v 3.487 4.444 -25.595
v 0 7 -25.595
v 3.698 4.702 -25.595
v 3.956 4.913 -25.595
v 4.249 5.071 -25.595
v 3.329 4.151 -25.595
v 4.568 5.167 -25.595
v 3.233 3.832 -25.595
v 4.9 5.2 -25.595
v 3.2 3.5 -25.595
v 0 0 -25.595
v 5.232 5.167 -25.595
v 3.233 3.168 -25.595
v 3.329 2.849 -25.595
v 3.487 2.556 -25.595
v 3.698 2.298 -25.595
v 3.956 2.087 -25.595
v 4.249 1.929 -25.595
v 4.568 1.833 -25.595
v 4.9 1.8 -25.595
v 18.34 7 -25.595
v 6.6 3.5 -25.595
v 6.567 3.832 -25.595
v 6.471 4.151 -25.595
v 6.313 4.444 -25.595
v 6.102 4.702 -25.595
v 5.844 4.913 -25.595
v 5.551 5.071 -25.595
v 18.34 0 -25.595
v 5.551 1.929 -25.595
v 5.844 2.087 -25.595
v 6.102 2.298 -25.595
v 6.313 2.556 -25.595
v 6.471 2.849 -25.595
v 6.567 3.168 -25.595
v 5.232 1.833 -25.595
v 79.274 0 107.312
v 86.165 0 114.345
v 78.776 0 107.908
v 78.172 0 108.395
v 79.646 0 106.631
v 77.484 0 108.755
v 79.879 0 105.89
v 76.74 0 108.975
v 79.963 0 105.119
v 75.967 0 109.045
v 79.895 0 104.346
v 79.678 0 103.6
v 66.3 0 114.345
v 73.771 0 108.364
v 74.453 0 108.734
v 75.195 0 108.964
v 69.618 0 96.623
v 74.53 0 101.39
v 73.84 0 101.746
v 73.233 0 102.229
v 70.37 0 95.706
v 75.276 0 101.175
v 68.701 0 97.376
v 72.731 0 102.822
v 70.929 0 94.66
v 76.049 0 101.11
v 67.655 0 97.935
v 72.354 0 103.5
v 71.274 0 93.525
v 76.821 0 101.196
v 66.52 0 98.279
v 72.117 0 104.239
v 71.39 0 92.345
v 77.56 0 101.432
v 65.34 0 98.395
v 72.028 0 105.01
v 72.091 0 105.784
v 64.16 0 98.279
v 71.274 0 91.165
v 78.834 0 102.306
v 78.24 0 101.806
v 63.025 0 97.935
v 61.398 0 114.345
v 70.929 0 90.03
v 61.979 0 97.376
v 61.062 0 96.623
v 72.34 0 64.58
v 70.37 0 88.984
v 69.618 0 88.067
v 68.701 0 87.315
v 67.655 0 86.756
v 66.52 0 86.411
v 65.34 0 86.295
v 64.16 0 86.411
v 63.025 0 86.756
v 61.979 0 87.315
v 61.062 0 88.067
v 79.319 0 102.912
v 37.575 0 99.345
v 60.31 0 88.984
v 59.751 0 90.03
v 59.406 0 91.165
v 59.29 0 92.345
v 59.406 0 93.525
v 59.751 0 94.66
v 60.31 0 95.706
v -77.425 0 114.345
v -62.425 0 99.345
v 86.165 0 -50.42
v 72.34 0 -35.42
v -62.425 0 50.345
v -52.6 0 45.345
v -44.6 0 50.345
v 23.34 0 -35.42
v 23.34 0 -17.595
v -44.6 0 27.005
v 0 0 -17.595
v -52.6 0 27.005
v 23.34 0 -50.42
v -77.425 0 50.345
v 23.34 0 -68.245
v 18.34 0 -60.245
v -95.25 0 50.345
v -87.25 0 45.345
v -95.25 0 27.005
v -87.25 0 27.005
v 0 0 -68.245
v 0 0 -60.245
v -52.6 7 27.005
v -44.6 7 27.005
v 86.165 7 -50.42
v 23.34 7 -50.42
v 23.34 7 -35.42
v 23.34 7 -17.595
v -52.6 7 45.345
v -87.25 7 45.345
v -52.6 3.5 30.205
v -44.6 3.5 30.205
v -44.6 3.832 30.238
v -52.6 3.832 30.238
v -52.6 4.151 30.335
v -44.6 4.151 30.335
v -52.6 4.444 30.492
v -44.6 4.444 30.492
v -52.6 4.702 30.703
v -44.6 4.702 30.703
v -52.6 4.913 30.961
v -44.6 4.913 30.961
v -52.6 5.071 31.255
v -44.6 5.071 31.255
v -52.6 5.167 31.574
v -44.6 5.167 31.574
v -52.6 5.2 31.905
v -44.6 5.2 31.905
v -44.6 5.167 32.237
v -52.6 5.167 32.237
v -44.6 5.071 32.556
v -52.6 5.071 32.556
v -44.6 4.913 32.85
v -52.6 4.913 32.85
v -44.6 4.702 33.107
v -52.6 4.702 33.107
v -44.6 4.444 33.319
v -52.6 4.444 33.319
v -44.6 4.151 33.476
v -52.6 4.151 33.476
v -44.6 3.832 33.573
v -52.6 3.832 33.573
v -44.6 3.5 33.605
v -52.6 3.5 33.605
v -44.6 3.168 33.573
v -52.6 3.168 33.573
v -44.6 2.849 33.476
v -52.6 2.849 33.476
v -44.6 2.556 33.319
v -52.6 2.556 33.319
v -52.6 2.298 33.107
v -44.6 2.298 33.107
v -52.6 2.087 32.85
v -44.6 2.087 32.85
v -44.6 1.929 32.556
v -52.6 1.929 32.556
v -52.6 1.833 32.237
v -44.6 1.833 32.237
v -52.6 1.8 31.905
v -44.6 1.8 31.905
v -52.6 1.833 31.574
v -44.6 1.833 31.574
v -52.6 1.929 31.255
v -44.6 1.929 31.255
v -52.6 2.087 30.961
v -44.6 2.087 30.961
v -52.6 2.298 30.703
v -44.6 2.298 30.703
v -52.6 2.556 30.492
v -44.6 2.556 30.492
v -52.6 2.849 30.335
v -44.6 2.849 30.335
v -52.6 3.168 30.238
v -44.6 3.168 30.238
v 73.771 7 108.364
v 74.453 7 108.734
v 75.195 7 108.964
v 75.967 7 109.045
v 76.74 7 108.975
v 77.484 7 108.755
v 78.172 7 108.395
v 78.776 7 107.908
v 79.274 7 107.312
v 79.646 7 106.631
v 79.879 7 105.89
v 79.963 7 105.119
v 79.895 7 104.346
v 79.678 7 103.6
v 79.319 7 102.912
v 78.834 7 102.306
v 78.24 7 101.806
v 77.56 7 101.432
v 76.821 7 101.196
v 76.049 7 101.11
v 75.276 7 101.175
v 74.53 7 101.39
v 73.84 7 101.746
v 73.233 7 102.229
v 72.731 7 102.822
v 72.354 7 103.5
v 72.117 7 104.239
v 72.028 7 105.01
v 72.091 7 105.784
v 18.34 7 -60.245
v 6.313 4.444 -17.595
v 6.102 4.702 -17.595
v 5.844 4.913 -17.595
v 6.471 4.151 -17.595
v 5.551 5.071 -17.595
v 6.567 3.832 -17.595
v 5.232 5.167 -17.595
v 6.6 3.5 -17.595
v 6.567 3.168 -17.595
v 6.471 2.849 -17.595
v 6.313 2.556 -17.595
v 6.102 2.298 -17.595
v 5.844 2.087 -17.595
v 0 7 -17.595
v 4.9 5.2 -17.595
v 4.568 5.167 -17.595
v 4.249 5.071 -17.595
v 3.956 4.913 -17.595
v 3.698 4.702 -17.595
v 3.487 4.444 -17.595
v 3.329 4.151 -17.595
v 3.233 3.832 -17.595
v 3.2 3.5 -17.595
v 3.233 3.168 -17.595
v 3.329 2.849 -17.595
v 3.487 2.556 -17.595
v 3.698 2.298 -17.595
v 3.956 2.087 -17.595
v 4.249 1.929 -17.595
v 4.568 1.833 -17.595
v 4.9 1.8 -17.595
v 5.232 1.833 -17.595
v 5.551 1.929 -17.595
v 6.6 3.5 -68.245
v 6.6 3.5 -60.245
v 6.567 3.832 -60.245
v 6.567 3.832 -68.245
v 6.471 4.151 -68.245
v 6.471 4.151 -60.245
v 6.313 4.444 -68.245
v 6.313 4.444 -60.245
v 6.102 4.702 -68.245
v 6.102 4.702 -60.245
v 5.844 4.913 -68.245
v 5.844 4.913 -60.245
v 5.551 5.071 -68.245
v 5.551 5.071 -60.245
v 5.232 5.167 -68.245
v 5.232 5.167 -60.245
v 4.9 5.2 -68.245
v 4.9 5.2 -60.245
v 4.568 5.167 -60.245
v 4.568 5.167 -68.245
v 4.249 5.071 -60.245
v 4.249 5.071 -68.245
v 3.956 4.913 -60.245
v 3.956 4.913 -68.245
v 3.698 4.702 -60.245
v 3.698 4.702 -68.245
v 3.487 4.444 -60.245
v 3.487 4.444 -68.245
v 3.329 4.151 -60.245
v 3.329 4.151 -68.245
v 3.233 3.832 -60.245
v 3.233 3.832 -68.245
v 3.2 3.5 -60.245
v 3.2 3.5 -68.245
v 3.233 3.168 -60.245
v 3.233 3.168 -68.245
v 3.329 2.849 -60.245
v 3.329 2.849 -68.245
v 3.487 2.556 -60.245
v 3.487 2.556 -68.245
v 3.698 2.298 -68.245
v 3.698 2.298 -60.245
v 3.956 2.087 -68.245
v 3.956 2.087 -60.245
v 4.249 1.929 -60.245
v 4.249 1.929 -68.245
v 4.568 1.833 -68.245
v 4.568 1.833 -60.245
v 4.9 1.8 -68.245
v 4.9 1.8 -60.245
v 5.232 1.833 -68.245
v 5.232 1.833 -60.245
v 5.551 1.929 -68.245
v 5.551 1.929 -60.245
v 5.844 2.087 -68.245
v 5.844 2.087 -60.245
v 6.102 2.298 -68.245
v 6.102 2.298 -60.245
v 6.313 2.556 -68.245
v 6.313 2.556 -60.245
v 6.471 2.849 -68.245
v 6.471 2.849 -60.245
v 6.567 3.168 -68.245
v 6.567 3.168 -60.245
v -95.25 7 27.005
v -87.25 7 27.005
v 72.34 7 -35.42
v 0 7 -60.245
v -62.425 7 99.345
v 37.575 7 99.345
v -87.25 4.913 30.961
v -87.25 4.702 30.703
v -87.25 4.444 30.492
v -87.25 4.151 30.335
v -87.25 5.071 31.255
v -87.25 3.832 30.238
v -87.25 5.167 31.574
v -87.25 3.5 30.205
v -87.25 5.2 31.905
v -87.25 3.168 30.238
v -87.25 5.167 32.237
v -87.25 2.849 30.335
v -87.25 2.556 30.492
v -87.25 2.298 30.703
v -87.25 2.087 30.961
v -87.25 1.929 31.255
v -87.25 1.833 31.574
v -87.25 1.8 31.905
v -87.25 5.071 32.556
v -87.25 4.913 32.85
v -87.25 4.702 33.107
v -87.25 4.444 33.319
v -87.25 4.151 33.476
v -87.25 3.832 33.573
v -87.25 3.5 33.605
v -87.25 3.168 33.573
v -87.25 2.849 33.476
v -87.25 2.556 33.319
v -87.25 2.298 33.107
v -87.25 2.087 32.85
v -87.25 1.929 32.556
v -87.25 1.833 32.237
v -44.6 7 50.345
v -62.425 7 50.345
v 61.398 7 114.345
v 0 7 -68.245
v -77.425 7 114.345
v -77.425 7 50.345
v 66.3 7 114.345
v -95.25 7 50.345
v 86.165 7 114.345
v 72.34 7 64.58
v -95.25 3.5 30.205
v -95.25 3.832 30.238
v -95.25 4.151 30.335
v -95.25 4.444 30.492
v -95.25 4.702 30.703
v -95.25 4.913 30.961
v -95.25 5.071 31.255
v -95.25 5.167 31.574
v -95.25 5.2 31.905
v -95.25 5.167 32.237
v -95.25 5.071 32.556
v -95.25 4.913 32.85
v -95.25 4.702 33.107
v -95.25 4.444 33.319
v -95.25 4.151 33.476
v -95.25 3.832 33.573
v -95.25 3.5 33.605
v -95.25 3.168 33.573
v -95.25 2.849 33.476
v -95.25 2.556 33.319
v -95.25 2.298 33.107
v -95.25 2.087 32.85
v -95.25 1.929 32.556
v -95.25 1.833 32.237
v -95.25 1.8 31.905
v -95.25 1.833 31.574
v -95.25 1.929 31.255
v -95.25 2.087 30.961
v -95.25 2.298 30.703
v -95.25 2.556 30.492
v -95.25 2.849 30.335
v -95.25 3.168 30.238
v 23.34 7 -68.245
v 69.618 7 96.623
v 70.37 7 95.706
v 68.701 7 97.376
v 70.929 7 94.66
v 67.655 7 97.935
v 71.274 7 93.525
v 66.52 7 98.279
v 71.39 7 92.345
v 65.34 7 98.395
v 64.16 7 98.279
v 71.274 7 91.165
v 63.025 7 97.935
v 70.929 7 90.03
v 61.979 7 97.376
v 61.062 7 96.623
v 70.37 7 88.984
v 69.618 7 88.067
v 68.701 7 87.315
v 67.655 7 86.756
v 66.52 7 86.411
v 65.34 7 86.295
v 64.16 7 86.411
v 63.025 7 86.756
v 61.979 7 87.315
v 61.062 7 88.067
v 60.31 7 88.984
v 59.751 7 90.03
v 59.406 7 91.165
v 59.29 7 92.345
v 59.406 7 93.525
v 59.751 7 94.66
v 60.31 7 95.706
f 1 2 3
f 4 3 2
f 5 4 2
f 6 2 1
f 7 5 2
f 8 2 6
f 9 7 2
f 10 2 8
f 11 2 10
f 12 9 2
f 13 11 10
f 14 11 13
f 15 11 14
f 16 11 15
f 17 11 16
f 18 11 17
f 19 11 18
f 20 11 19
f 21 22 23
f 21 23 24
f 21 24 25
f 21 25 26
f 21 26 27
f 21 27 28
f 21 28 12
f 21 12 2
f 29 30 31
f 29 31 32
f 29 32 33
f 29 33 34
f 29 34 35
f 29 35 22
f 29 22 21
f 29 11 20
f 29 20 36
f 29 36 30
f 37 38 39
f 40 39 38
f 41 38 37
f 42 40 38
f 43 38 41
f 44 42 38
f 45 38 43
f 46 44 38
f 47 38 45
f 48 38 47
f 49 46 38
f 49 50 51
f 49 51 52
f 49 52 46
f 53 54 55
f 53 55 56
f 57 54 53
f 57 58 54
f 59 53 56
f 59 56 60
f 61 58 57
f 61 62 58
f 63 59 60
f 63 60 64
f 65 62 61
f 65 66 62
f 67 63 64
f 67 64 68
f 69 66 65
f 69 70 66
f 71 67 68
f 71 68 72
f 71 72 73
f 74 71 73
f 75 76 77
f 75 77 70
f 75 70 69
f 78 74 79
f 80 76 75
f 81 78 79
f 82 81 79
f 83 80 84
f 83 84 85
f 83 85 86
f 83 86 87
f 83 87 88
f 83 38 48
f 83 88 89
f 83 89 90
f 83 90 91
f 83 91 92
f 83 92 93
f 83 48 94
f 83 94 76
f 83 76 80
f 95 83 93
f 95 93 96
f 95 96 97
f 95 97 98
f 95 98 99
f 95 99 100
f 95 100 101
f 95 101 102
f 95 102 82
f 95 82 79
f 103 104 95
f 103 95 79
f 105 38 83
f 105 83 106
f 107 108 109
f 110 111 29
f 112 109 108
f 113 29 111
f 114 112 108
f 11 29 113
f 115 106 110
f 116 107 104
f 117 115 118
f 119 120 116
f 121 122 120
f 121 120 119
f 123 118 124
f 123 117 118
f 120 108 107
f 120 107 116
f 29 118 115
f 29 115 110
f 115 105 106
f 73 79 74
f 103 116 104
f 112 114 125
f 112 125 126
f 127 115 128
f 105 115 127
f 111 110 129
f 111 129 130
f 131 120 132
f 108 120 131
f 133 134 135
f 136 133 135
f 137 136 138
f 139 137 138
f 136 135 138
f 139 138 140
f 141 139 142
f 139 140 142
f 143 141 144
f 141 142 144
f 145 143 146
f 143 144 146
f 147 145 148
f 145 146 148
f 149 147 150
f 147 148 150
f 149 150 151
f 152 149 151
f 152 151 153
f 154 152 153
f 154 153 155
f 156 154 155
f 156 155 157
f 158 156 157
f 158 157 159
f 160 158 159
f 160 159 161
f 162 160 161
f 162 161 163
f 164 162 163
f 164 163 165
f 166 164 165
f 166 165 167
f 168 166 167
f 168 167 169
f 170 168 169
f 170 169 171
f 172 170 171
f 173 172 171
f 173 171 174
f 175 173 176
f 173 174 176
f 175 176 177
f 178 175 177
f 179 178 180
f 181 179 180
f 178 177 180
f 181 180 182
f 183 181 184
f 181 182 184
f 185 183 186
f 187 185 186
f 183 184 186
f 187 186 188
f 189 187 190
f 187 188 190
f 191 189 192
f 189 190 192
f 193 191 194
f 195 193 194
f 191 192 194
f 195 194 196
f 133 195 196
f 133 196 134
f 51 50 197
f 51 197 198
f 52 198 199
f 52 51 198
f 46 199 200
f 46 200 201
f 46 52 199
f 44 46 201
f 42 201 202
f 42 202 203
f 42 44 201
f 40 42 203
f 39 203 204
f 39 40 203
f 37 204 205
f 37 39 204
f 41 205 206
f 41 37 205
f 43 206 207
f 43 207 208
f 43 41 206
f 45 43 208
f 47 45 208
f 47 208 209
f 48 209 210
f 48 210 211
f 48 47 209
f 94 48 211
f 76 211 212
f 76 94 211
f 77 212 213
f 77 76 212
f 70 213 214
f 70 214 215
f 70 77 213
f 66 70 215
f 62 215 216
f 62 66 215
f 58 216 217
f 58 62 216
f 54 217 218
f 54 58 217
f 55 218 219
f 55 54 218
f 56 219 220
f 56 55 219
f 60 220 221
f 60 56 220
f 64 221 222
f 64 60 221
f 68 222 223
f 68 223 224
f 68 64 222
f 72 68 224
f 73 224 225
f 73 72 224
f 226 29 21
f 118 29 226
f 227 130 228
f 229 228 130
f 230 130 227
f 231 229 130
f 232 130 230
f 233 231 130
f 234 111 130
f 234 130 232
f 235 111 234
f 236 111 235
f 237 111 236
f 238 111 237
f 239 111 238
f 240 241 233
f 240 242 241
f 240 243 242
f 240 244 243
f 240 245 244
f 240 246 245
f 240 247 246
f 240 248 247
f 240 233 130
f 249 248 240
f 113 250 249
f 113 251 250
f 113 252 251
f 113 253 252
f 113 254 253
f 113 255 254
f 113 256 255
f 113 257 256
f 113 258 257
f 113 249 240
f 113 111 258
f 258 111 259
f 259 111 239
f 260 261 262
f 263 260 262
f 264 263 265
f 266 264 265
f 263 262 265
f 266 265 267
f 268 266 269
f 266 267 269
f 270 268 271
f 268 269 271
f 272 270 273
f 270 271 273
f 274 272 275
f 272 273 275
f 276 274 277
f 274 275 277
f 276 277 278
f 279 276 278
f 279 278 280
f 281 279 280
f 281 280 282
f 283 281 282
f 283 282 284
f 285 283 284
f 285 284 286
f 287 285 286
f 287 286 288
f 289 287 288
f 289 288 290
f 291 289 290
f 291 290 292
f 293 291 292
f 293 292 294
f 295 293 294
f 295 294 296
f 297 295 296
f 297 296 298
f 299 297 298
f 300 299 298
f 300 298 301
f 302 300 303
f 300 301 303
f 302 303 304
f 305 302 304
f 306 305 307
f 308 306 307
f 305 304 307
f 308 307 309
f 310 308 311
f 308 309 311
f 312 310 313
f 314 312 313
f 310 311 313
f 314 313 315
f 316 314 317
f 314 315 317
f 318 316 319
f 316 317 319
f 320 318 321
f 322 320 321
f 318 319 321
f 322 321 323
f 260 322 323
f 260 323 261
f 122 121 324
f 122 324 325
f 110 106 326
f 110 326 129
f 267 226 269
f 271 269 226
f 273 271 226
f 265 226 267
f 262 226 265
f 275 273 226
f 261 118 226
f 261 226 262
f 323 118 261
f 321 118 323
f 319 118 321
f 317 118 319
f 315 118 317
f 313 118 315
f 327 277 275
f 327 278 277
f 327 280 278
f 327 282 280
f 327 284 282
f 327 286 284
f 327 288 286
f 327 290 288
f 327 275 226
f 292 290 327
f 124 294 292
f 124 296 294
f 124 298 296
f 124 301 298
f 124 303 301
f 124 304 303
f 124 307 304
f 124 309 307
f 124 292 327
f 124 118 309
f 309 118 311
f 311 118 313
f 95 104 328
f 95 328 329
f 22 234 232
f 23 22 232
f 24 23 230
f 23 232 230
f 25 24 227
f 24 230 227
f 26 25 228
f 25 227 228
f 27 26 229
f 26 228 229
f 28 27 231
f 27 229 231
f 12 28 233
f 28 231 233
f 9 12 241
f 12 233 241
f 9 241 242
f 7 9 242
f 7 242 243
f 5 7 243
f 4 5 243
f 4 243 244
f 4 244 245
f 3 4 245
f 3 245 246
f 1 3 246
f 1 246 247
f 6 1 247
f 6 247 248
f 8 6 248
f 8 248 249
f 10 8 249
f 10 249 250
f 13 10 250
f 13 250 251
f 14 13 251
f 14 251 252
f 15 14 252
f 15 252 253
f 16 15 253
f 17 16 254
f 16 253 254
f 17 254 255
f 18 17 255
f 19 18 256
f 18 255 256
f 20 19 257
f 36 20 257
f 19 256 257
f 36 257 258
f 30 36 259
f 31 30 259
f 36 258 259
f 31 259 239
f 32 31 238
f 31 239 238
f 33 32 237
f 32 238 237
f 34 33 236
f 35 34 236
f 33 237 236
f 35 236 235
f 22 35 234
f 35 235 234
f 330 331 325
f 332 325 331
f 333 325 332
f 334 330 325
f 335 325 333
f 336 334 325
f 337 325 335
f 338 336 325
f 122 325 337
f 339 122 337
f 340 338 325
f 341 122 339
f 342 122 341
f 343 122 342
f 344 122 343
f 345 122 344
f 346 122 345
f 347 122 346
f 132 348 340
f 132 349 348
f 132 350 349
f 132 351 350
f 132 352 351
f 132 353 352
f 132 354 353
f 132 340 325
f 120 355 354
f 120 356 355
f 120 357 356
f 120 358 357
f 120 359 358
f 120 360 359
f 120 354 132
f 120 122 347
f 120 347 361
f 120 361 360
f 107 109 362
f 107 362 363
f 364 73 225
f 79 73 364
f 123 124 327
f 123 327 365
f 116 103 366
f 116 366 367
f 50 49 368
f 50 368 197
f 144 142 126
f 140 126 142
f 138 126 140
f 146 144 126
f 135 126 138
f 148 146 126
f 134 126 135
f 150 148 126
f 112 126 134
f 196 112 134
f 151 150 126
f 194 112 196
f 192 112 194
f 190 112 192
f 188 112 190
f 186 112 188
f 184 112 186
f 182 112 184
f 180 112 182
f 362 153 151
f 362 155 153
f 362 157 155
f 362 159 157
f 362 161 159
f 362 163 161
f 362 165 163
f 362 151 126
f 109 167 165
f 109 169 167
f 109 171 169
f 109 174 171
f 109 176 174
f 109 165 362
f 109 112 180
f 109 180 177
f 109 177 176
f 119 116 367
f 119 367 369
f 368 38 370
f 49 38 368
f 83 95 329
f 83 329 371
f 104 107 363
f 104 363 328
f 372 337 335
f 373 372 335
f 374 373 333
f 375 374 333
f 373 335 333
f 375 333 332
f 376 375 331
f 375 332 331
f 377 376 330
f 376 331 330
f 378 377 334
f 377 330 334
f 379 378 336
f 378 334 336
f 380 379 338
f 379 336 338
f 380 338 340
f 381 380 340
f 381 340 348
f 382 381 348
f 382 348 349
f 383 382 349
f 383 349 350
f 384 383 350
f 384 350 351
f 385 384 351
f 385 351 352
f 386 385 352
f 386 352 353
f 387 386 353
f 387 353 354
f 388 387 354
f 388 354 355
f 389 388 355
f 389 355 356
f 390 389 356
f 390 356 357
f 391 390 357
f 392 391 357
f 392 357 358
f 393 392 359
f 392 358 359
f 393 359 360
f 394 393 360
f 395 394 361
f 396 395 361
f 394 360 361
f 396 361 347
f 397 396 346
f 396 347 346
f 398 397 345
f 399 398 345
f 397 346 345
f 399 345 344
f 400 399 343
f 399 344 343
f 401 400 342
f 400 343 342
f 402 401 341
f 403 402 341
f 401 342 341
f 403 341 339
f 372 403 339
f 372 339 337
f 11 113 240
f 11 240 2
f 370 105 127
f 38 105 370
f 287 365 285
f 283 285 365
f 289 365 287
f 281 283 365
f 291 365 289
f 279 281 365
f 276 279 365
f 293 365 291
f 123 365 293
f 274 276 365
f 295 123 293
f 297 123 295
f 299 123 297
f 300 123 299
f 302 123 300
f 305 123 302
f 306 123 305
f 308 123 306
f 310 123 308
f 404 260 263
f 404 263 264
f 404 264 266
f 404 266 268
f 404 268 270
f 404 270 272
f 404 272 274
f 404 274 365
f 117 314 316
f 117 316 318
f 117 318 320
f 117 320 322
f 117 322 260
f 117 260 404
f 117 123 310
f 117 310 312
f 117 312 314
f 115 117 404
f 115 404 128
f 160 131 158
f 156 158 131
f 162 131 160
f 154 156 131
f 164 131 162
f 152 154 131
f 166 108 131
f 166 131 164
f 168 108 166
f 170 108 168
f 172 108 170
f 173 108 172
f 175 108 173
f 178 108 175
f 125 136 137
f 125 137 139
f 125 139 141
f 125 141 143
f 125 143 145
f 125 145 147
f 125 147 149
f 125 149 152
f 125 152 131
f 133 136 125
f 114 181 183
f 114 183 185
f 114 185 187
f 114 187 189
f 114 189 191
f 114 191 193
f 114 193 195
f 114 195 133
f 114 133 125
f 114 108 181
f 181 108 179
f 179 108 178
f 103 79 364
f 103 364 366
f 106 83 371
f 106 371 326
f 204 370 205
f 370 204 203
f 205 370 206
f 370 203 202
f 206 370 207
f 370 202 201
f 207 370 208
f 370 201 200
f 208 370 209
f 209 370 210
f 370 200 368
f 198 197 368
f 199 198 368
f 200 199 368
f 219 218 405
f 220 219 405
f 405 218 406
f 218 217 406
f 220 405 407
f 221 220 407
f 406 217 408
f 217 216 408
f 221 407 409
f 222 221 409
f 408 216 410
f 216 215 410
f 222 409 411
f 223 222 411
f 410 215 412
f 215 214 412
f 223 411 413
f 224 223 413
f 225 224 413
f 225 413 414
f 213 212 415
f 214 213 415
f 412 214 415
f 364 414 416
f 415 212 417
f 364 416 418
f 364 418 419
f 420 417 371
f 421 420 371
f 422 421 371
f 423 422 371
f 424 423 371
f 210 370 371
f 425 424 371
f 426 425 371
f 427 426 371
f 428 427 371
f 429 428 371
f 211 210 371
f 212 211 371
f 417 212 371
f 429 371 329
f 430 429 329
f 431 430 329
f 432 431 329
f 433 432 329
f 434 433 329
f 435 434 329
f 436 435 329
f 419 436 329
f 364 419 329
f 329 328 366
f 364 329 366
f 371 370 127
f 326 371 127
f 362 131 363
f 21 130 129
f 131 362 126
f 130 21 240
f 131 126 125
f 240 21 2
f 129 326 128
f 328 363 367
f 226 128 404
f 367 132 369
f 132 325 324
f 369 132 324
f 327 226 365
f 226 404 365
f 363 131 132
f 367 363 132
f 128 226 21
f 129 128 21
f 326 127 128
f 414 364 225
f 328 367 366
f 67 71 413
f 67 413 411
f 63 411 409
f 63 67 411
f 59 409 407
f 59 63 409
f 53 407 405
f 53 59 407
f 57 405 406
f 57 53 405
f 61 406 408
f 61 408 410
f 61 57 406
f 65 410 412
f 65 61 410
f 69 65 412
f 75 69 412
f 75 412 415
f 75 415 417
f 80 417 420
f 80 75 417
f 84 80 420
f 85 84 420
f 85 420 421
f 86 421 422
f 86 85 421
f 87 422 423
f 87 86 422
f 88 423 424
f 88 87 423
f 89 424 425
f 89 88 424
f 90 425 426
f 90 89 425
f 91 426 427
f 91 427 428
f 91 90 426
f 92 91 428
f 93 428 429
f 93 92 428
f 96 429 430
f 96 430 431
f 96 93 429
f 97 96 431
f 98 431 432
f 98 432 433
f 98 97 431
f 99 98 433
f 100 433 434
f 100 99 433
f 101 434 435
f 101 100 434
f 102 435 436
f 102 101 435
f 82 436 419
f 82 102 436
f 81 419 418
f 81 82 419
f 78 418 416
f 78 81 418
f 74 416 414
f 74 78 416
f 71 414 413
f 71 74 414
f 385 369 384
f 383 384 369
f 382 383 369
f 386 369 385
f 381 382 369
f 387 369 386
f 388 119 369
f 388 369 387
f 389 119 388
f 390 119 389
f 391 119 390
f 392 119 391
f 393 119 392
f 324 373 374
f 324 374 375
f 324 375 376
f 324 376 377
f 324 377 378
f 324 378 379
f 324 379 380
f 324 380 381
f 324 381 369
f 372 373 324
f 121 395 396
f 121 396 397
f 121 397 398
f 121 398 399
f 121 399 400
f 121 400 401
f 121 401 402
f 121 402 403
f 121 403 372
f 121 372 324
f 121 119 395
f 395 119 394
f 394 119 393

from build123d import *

# Parameters (mm, degrees)
SKETCH1_R           = 6.05
BOSS_EXTRUDE1_DEPTH = 7
SKETCH2_R           = 1.7
CUT_EXTRUDE1_DEPTH  = 60
SKETCH3_R           = 1.7
CUT_EXTRUDE2_DEPTH  = 60


with BuildPart() as part:
    # Sketch1 → Boss-Extrude1 (new body)
    with BuildSketch(Plane(origin=(0, 0, 0), x_dir=(1, 0, 0), z_dir=(0, 1, 0))):
        with BuildLine():
            Line((-87.25, -27.005178012), (-87.25, -45.345178012))
            Line((-87.25, -45.345178012), (-52.6, -45.345178012))
            Line((-52.6, -45.345178012), (-52.6, -27.005178012))
            Line((-52.6, -27.005178012), (-44.6, -27.005178012))
            Line((-44.6, -27.005178012), (-44.6, -50.345178012))
            Line((-44.6, -50.345178012), (-62.425, -50.345178012))
            Line((-62.425, -50.345178012), (-62.425, -99.345178012))
            Line((-62.425, -99.345178012), (37.575, -99.345178012))
            Line((37.575, -99.345178012), (72.34, -64.580178012))
            Line((72.34, -64.580178012), (72.34, 35.419821988))
            Line((72.34, 35.419821988), (23.34, 35.419821988))
            Line((23.34, 35.419821988), (23.34, 17.594821988))
            Line((23.34, 17.594821988), (0, 17.594821988))
            Line((0, 17.594821988), (0, 25.594821988))
            Line((0, 25.594821988), (18.34, 25.594821988))
            Line((18.34, 25.594821988), (18.34, 60.244821988))
            Line((18.34, 60.244821988), (0, 60.244821988))
            Line((0, 60.244821988), (0, 68.244821988))
            Line((0, 68.244821988), (23.34, 68.244821988))
            Line((23.34, 68.244821988), (23.34, 50.419821988))
            Line((23.34, 50.419821988), (86.165, 50.419821988))
            Line((86.165, 50.419821988), (86.165, -65.755178012))
            Line((86.165, -65.755178012), (86.165, -114.345178012))
            Line((86.165, -114.345178012), (66.299963518, -114.345178012))
            Line((66.299963518, -114.345178012), (73.771063238, -108.363510987))
            ThreePointArc((73.771063238, -108.363510987), (79.319481987, -102.911578198), (72.090531111, -105.783997211))
            Line((72.090531111, -105.783997211), (61.397619718, -114.345178012))
            Line((61.397619718, -114.345178012), (37.575, -114.345178012))
            Line((37.575, -114.345178012), (-77.425, -114.345178012))
            Line((-77.425, -114.345178012), (-77.425, -50.345178012))
            Line((-77.425, -50.345178012), (-95.25, -50.345178012))
            Line((-95.25, -50.345178012), (-95.25, -27.005178012))
            Line((-95.25, -27.005178012), (-87.25, -27.005178012))
        make_face()
        with Locations(Location((65.34, -92.345178012, 0), (0, 0, 270))):
            Circle(SKETCH1_R, mode=Mode.SUBTRACT)
    extrude(amount=BOSS_EXTRUDE1_DEPTH)

    # Sketch2 → Cut-Extrude1 (cut)
    with BuildSketch(Plane.XY.offset(-17.594821988)):
        with Locations((4.9, 3.5)):
            Circle(SKETCH2_R)
    extrude(amount=-CUT_EXTRUDE1_DEPTH, mode=Mode.SUBTRACT)

    # Sketch3 → Cut-Extrude2 (cut)
    with BuildSketch(Plane(origin=(-44.6, 0, 0), x_dir=(0, 0, -1), z_dir=(1, 0, 0))):
        with Locations((-31.905178012, 3.5)):
            Circle(SKETCH3_R)
    extrude(amount=-CUT_EXTRUDE2_DEPTH, mode=Mode.SUBTRACT)


solid = part.part
